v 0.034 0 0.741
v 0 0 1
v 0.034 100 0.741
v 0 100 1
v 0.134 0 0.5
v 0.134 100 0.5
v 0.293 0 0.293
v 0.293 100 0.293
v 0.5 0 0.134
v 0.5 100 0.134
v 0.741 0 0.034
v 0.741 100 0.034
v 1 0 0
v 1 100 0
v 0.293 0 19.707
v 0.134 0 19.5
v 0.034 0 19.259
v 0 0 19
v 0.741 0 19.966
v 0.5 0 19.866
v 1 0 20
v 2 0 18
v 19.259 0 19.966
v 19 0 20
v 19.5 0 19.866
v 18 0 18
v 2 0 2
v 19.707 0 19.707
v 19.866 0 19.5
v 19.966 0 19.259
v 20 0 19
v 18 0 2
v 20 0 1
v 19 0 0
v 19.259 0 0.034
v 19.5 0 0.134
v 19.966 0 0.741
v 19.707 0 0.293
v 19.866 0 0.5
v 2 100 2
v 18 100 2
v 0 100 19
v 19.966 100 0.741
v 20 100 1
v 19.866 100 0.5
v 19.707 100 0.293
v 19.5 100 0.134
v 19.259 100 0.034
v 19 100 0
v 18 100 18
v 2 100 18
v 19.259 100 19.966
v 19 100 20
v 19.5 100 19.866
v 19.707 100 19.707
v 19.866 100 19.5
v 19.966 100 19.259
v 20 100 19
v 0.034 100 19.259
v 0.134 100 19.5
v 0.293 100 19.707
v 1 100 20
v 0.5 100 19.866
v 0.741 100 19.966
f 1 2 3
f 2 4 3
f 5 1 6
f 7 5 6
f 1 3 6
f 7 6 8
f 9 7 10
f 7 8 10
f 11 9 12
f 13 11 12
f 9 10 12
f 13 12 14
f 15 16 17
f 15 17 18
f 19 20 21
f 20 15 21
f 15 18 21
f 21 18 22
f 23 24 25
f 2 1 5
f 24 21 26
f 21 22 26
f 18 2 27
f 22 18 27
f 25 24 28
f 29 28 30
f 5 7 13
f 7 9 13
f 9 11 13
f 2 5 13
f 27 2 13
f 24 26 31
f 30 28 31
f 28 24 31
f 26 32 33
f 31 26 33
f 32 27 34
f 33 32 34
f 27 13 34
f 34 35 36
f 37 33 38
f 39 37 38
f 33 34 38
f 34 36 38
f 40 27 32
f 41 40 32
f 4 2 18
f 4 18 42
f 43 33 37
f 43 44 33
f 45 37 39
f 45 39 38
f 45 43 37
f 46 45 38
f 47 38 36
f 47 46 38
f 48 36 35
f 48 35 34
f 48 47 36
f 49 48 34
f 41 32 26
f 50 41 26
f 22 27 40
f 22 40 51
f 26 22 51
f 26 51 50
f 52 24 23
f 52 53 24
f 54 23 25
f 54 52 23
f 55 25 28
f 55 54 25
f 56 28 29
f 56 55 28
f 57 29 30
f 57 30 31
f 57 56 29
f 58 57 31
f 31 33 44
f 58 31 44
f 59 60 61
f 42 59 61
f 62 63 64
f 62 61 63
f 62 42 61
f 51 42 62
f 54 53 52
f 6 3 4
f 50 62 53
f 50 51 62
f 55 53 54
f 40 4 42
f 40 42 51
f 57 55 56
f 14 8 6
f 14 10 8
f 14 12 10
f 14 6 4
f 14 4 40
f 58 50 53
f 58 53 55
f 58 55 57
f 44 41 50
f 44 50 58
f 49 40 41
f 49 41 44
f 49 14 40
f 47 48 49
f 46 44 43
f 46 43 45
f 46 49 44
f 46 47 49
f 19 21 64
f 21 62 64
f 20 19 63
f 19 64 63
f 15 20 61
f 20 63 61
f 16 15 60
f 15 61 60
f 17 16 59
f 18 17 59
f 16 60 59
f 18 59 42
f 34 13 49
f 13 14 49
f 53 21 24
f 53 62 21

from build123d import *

# Parameters (mm, degrees)
SKETCH_W     = 20
SKETCH_H     = 100
PAD_DEPTH    = 20
SKETCH001_W  = 16
SKETCH001_H  = 16
POCKET_DEPTH = 100.001
FILLET_R     = 1
FILLET001_R  = 1
FILLET002_R  = 1


with BuildPart() as part:
    # Sketch → Pad (new body)
    with BuildSketch(Plane.XY):
        with Locations((10, 50)):
            Rectangle(SKETCH_W, SKETCH_H)
    extrude(amount=PAD_DEPTH)

    # Sketch001 (on Face1 of Pad) → Pocket (cut, through all)
    with BuildSketch(Plane.XZ):
        with Locations((10, 10)):
            Rectangle(SKETCH001_W, SKETCH001_H)
    extrude(amount=-POCKET_DEPTH, mode=Mode.SUBTRACT)

    # Fillet
    fillet_edges = [part.edges().sort_by_distance(p)[0] for p in [
        (20, 50, 20),
    ]]
    fillet(fillet_edges, radius=FILLET_R)

    # Fillet001
    fillet001_edges = [part.edges().sort_by_distance(p)[0] for p in [
        (0, 50, 20),
    ]]
    fillet(fillet001_edges, radius=FILLET001_R)

    # Fillet002
    fillet002_edges = [part.edges().sort_by_distance(p)[0] for p in [
        (0, 50, 0),
        (20, 50, 0),
    ]]
    fillet(fillet002_edges, radius=FILLET002_R)


solid = part.part
